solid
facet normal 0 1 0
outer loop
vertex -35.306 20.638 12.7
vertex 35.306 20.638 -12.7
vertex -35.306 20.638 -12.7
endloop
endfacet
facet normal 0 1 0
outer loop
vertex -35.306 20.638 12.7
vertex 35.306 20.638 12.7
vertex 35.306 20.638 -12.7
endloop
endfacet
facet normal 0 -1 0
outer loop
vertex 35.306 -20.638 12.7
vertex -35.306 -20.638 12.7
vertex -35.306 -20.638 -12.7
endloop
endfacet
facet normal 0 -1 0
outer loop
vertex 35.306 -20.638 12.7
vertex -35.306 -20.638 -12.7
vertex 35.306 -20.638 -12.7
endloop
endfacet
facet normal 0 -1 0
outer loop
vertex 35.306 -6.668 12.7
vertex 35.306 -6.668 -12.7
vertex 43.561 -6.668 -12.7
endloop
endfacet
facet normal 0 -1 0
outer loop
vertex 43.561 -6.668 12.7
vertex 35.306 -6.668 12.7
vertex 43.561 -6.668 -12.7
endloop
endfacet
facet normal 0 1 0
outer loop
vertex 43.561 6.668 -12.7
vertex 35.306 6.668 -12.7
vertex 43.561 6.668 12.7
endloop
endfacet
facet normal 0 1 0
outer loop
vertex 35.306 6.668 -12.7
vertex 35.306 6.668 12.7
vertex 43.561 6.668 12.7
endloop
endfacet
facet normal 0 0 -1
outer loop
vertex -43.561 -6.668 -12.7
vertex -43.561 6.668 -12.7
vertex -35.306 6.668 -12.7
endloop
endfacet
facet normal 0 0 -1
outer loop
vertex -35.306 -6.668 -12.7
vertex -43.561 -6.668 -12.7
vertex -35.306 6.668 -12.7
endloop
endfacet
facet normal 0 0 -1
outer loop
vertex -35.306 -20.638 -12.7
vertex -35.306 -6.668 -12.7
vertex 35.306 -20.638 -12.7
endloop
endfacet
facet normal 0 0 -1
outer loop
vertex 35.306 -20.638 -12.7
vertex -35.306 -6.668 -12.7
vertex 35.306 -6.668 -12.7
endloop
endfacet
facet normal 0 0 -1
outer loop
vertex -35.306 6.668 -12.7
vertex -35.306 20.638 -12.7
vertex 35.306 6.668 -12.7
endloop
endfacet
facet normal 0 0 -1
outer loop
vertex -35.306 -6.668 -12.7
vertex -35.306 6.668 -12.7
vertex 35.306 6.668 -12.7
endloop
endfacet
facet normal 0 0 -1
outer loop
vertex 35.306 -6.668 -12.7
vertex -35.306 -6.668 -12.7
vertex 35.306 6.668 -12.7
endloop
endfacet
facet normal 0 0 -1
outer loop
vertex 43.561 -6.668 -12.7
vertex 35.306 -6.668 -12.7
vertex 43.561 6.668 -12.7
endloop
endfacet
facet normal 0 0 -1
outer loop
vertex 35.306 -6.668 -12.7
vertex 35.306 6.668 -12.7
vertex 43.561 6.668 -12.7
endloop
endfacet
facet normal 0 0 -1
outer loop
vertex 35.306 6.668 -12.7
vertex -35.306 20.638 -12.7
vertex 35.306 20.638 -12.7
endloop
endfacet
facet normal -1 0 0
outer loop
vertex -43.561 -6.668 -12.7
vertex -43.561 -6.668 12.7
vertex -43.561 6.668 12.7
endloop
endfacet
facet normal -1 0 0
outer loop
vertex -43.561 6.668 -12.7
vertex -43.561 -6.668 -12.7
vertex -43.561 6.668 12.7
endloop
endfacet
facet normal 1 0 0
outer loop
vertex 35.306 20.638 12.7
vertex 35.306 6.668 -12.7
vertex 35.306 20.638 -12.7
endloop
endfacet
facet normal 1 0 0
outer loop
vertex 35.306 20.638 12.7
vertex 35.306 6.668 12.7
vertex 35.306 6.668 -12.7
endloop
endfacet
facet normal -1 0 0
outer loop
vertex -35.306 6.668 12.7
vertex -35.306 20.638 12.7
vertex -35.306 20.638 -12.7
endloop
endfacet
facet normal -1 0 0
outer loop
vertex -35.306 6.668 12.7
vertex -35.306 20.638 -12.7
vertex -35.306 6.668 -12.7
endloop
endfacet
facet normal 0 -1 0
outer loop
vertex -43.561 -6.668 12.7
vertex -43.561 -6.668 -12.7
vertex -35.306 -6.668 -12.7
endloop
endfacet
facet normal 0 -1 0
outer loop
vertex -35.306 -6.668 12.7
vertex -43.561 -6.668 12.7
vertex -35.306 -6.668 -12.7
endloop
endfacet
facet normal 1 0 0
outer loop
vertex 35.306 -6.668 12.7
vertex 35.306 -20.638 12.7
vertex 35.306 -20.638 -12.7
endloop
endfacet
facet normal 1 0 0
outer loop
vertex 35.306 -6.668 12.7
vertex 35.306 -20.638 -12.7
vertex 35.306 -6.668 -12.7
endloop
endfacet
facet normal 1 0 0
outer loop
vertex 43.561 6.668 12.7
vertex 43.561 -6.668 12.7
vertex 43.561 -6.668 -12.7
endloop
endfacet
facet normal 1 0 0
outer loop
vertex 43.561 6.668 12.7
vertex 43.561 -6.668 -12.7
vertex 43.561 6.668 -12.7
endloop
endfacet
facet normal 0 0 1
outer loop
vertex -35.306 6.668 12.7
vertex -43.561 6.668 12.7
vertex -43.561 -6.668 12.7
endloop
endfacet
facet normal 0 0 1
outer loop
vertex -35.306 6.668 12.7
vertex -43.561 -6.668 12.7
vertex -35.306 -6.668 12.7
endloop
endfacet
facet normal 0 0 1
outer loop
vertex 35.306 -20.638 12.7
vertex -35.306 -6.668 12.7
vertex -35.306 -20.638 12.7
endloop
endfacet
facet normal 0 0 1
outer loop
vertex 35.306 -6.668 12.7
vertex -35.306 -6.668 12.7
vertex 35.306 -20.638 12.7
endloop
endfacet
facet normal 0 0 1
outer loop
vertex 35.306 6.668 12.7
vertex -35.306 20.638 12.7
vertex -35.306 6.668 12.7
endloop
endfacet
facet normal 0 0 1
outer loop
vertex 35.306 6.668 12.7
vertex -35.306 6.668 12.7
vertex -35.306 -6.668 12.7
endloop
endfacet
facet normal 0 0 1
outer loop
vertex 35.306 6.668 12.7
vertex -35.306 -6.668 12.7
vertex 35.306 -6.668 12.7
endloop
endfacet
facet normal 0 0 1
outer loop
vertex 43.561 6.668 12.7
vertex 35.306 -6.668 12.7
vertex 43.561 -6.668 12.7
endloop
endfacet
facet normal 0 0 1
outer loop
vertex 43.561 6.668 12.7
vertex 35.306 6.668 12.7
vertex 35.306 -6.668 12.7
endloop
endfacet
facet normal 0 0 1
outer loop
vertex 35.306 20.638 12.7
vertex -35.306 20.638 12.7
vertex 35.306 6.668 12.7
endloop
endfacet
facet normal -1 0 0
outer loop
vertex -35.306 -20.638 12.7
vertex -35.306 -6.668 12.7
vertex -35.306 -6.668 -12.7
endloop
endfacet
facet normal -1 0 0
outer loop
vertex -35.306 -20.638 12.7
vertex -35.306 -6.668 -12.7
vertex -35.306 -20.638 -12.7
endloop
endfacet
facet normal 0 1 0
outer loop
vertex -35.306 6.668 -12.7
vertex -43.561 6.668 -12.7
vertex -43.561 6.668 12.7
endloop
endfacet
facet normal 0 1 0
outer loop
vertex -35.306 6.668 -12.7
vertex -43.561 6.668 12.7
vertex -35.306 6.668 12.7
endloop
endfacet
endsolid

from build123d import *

# Parameters (mm, degrees)
F0_W     = 8.255
F0_H     = 13.335
F1_DEPTH = 12.7


with BuildPart() as f1:
    # F0 (on Top) → F1 (new body, symmetric)
    with BuildSketch(Plane.XY):
        Polygon((35.306, 6.6675), (35.306, 20.6375), (-35.306, 20.6375), (-35.306, 6.6675), (-35.306, -6.6675), (-35.306, -20.6375), (35.306, -20.6375), (35.306, -6.6675), align=None)
        with Locations((-39.4335, 0)):
            Rectangle(F0_W, F0_H)
        with Locations((39.4335, 0)):
            Rectangle(F0_W, F0_H)
    extrude(amount=F1_DEPTH, both=True)


solid = f1.part
